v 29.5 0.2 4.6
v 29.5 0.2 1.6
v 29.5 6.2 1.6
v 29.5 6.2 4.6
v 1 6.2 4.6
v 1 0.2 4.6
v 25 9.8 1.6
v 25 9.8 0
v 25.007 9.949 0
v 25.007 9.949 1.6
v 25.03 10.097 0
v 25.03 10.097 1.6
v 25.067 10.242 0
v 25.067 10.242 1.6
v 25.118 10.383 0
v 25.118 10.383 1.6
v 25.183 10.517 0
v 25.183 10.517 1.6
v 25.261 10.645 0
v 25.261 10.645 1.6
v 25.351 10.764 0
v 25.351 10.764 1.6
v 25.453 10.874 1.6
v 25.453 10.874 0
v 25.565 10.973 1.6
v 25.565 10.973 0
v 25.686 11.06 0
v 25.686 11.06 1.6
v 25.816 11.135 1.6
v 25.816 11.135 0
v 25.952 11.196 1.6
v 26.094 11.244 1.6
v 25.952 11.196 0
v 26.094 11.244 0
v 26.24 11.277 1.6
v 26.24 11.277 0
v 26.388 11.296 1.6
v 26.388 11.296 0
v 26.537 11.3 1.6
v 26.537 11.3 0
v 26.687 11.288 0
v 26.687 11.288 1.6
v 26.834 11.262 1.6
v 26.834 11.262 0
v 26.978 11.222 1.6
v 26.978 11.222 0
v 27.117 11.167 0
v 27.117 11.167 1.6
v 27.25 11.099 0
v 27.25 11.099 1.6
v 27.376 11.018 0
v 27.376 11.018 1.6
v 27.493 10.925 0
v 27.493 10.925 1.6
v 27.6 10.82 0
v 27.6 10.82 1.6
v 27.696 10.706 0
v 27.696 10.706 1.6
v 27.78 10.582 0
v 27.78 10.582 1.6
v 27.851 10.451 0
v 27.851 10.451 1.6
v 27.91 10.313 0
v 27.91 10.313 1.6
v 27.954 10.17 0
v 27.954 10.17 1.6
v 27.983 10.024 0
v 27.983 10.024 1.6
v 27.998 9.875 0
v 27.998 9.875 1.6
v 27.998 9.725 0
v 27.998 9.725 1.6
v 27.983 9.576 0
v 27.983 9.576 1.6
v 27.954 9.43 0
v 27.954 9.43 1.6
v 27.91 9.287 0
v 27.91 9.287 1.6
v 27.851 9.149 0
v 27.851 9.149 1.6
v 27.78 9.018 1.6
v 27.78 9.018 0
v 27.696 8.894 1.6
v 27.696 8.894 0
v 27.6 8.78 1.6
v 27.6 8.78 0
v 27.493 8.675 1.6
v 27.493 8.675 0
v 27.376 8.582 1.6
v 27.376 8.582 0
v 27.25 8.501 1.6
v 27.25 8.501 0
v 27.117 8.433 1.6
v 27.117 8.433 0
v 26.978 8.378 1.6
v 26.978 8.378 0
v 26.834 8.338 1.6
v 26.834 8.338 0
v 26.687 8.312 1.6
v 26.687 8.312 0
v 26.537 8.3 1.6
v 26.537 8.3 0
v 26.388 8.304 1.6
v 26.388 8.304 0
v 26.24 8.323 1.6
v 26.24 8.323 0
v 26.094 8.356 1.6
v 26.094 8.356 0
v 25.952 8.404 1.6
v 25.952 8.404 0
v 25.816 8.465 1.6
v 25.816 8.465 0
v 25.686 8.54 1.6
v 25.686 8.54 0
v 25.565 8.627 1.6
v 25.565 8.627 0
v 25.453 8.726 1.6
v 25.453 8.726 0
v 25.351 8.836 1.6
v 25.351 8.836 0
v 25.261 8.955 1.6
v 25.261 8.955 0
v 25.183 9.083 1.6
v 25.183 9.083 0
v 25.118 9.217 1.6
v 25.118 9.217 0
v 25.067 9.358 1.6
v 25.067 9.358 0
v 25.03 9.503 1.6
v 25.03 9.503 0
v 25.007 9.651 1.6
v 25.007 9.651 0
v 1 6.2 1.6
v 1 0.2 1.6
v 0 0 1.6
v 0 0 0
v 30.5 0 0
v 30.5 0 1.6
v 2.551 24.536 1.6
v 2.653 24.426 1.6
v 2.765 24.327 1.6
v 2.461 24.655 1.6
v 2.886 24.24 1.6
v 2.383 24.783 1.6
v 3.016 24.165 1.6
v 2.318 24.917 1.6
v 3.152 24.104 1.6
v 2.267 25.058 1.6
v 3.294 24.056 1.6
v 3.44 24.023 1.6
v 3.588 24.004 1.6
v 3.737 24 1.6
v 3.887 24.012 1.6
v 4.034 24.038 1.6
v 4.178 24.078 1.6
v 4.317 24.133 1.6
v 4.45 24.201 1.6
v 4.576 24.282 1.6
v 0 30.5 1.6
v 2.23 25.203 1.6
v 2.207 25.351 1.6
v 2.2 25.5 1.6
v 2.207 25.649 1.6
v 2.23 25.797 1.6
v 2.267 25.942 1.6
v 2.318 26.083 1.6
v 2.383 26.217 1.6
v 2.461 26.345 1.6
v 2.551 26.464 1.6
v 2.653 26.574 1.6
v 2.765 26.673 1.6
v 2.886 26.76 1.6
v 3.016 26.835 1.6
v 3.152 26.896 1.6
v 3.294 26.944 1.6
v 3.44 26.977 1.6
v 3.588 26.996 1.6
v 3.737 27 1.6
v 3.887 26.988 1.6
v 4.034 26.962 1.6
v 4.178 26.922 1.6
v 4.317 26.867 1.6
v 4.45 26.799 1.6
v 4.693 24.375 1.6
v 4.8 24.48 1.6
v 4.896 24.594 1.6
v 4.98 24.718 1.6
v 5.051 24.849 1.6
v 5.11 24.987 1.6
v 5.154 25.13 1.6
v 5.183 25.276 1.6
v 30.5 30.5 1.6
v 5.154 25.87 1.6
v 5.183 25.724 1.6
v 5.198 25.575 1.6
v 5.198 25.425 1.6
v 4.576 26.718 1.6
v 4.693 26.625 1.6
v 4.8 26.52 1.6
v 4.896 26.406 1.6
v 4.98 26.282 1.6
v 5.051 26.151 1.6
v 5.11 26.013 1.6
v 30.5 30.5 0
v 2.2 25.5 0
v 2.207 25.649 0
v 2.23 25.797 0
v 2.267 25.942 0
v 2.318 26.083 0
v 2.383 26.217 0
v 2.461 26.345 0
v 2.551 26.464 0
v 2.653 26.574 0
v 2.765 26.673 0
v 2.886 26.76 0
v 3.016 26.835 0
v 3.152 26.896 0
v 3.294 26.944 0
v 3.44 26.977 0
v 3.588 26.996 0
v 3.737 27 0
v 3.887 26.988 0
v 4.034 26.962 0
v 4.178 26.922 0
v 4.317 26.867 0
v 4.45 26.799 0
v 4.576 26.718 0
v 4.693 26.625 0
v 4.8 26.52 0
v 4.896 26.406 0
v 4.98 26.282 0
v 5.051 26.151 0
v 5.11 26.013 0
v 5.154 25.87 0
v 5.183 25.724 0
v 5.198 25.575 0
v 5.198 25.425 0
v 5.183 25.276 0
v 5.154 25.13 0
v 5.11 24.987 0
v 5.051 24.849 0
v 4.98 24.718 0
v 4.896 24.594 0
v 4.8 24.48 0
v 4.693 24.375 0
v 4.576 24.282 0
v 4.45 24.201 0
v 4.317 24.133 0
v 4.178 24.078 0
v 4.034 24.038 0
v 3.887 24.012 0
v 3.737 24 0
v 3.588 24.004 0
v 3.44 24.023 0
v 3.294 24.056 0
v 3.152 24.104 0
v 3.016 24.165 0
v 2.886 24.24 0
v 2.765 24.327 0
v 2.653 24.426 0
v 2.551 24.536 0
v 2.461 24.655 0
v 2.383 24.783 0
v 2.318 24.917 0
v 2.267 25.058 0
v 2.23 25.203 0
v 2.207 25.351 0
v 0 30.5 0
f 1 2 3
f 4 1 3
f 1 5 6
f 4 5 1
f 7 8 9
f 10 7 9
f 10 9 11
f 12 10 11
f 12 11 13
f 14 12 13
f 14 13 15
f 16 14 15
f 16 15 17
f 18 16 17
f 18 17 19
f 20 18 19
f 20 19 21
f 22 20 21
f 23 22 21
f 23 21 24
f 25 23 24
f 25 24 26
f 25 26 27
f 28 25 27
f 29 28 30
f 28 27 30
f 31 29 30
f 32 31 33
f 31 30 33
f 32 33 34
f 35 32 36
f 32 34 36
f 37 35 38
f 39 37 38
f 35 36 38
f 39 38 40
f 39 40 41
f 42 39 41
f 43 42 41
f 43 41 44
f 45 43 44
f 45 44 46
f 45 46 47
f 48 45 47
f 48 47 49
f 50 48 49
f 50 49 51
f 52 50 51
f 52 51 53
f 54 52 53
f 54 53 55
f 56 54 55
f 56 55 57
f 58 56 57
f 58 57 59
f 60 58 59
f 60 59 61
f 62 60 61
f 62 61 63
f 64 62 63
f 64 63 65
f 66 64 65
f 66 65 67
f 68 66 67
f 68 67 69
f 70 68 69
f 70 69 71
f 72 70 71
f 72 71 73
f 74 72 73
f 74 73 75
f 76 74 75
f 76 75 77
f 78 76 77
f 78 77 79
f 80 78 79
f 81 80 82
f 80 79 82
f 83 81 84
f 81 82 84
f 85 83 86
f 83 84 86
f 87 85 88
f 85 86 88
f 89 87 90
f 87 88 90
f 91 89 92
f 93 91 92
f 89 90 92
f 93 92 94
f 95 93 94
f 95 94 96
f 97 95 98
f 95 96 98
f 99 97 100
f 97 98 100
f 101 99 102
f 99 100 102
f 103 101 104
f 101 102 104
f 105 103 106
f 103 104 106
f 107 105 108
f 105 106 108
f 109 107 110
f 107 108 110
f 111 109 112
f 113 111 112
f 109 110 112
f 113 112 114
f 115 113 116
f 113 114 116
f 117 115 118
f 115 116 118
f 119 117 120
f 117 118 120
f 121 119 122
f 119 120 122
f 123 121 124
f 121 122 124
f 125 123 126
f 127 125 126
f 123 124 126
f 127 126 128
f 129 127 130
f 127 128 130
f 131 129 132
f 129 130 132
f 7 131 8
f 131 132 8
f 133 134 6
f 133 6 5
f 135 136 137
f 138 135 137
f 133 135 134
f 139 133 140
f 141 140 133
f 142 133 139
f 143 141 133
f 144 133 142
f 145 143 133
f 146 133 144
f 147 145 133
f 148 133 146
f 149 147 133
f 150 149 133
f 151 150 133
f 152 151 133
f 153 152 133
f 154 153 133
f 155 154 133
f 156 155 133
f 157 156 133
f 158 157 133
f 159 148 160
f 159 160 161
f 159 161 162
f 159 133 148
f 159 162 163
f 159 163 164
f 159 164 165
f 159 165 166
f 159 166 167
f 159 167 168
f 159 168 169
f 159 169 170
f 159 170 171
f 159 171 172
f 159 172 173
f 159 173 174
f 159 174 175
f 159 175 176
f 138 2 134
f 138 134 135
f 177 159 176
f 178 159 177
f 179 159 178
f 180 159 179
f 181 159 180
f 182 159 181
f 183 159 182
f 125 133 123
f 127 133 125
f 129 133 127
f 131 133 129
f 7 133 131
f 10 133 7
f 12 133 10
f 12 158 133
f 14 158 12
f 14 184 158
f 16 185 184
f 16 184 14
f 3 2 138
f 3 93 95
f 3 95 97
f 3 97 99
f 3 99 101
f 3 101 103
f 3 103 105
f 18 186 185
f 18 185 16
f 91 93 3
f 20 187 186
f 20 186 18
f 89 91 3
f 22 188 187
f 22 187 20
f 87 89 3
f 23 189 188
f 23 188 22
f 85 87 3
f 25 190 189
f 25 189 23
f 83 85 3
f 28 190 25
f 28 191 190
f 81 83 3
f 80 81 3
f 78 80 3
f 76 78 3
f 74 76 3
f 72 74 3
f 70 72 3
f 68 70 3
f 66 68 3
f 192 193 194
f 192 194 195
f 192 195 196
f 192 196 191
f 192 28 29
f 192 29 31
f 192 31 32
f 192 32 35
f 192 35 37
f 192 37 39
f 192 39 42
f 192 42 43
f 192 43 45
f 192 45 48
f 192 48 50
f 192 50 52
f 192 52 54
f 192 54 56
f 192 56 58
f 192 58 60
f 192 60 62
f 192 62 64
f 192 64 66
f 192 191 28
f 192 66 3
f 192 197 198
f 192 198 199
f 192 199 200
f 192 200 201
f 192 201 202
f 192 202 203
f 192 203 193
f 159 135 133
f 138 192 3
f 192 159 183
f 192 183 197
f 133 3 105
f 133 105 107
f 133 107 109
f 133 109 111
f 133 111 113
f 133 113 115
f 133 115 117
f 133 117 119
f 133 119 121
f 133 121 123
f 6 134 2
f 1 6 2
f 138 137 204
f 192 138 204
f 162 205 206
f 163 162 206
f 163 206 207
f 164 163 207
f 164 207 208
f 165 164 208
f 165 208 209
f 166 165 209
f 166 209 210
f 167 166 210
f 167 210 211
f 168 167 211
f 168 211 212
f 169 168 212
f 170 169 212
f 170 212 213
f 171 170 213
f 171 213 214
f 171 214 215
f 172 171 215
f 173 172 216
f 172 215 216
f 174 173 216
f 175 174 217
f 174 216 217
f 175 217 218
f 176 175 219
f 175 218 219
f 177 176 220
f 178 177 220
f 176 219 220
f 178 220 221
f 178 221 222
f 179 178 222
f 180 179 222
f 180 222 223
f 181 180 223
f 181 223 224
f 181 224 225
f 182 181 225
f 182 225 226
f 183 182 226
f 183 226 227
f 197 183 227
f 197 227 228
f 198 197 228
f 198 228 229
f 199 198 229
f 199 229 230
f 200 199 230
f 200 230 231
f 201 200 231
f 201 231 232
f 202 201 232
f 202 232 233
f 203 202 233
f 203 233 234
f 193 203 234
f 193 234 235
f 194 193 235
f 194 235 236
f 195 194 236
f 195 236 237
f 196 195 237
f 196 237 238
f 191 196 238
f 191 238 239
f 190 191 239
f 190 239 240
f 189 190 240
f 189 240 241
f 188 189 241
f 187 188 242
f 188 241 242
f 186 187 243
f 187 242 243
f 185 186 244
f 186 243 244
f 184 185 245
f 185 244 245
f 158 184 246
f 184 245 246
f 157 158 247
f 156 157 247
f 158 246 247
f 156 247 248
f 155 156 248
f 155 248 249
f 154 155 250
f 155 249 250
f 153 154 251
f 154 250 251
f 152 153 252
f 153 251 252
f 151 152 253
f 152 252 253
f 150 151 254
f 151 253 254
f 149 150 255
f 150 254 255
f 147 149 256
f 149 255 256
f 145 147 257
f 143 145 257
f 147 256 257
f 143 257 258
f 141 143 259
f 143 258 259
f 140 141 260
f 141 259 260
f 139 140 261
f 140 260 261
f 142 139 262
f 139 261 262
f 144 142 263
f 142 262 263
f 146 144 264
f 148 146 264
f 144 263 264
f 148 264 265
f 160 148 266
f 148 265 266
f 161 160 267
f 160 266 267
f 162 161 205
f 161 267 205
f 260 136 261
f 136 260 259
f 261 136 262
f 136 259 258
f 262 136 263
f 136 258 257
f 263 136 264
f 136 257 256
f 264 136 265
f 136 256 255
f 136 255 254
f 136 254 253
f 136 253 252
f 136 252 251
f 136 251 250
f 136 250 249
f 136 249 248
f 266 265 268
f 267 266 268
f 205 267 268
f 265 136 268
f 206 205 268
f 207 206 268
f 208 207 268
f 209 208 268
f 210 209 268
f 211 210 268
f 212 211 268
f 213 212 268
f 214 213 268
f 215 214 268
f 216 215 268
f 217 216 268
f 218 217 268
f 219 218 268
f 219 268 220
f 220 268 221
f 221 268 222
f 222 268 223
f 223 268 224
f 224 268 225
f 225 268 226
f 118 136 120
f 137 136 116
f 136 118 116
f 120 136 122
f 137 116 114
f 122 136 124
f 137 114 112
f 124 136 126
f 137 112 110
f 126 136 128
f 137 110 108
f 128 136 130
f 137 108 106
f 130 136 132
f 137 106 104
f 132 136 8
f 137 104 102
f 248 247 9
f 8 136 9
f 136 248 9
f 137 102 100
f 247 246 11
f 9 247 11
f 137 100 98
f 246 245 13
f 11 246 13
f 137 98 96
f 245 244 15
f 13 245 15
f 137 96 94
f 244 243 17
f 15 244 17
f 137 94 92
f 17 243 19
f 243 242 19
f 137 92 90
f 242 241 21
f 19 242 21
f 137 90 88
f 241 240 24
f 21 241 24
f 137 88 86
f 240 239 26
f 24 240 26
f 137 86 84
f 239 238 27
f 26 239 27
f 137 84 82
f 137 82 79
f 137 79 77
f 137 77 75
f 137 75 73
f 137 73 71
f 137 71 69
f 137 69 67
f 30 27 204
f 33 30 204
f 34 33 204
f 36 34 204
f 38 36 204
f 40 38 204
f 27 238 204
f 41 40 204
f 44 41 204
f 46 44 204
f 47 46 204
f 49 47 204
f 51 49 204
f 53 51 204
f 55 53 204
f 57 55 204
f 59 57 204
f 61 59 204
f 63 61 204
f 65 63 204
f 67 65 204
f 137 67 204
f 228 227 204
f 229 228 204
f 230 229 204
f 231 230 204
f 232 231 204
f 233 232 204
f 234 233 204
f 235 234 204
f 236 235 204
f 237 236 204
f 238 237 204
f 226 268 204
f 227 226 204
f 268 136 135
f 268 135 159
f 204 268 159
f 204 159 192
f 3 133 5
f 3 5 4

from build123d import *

# Parameters (mm, degrees)
SKETCH1_W             = 30.5
SKETCH1_H             = 30.5
BOSS_EXTRUDE1_DEPTH   = 1.6
F_3_0MM_DOWEL_HOLE1_D = 3
SKETCH4_W             = 28.5
SKETCH4_H             = 6
BOSS_EXTRUDE2_DEPTH   = 3


with BuildPart() as part:
    # Sketch1 → Boss-Extrude1 (new body)
    with BuildSketch(Plane.XY):
        with Locations((15.25, 15.25)):
            Rectangle(SKETCH1_W, SKETCH1_H)
    extrude(amount=BOSS_EXTRUDE1_DEPTH)

    # Ø3.0mm Dowel Hole1 (through all)
    with Locations(Plane.XY.offset(1.6)):
        with Locations((3.7, 25.5), (26.5, 9.8)):
            Hole(F_3_0MM_DOWEL_HOLE1_D / 2)

    # Sketch4 → Boss-Extrude2 (add)
    with BuildSketch(Plane.XY.offset(1.6)):
        with Locations((15.25, 3.2)):
            Rectangle(SKETCH4_W, SKETCH4_H)
    extrude(amount=BOSS_EXTRUDE2_DEPTH)


solid = part.part
